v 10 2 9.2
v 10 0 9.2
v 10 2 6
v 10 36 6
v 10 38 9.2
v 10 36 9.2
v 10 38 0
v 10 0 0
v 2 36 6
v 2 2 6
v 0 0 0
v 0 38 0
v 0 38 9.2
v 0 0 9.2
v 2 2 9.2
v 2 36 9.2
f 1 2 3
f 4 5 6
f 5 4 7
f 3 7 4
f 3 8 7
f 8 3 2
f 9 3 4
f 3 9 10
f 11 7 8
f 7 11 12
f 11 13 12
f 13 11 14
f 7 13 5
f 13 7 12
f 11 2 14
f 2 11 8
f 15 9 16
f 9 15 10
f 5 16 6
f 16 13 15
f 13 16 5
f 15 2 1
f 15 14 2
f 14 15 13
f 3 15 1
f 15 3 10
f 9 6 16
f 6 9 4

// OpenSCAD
jig_width = 10;
hinge_length = 34;
frame_lip = 4;
jig_thickness = 6;
raised_edge_height = 3.2;

total_length = hinge_length + frame_lip;

union() {
  cube([jig_width, total_length, jig_thickness]);
  cube([2, total_length, jig_thickness + raised_edge_height]);
  cube([jig_width, 2, jig_thickness + raised_edge_height]);
  translate([0, total_length - 2, 0])
    cube([jig_width, 2, jig_thickness + raised_edge_height]);
}
